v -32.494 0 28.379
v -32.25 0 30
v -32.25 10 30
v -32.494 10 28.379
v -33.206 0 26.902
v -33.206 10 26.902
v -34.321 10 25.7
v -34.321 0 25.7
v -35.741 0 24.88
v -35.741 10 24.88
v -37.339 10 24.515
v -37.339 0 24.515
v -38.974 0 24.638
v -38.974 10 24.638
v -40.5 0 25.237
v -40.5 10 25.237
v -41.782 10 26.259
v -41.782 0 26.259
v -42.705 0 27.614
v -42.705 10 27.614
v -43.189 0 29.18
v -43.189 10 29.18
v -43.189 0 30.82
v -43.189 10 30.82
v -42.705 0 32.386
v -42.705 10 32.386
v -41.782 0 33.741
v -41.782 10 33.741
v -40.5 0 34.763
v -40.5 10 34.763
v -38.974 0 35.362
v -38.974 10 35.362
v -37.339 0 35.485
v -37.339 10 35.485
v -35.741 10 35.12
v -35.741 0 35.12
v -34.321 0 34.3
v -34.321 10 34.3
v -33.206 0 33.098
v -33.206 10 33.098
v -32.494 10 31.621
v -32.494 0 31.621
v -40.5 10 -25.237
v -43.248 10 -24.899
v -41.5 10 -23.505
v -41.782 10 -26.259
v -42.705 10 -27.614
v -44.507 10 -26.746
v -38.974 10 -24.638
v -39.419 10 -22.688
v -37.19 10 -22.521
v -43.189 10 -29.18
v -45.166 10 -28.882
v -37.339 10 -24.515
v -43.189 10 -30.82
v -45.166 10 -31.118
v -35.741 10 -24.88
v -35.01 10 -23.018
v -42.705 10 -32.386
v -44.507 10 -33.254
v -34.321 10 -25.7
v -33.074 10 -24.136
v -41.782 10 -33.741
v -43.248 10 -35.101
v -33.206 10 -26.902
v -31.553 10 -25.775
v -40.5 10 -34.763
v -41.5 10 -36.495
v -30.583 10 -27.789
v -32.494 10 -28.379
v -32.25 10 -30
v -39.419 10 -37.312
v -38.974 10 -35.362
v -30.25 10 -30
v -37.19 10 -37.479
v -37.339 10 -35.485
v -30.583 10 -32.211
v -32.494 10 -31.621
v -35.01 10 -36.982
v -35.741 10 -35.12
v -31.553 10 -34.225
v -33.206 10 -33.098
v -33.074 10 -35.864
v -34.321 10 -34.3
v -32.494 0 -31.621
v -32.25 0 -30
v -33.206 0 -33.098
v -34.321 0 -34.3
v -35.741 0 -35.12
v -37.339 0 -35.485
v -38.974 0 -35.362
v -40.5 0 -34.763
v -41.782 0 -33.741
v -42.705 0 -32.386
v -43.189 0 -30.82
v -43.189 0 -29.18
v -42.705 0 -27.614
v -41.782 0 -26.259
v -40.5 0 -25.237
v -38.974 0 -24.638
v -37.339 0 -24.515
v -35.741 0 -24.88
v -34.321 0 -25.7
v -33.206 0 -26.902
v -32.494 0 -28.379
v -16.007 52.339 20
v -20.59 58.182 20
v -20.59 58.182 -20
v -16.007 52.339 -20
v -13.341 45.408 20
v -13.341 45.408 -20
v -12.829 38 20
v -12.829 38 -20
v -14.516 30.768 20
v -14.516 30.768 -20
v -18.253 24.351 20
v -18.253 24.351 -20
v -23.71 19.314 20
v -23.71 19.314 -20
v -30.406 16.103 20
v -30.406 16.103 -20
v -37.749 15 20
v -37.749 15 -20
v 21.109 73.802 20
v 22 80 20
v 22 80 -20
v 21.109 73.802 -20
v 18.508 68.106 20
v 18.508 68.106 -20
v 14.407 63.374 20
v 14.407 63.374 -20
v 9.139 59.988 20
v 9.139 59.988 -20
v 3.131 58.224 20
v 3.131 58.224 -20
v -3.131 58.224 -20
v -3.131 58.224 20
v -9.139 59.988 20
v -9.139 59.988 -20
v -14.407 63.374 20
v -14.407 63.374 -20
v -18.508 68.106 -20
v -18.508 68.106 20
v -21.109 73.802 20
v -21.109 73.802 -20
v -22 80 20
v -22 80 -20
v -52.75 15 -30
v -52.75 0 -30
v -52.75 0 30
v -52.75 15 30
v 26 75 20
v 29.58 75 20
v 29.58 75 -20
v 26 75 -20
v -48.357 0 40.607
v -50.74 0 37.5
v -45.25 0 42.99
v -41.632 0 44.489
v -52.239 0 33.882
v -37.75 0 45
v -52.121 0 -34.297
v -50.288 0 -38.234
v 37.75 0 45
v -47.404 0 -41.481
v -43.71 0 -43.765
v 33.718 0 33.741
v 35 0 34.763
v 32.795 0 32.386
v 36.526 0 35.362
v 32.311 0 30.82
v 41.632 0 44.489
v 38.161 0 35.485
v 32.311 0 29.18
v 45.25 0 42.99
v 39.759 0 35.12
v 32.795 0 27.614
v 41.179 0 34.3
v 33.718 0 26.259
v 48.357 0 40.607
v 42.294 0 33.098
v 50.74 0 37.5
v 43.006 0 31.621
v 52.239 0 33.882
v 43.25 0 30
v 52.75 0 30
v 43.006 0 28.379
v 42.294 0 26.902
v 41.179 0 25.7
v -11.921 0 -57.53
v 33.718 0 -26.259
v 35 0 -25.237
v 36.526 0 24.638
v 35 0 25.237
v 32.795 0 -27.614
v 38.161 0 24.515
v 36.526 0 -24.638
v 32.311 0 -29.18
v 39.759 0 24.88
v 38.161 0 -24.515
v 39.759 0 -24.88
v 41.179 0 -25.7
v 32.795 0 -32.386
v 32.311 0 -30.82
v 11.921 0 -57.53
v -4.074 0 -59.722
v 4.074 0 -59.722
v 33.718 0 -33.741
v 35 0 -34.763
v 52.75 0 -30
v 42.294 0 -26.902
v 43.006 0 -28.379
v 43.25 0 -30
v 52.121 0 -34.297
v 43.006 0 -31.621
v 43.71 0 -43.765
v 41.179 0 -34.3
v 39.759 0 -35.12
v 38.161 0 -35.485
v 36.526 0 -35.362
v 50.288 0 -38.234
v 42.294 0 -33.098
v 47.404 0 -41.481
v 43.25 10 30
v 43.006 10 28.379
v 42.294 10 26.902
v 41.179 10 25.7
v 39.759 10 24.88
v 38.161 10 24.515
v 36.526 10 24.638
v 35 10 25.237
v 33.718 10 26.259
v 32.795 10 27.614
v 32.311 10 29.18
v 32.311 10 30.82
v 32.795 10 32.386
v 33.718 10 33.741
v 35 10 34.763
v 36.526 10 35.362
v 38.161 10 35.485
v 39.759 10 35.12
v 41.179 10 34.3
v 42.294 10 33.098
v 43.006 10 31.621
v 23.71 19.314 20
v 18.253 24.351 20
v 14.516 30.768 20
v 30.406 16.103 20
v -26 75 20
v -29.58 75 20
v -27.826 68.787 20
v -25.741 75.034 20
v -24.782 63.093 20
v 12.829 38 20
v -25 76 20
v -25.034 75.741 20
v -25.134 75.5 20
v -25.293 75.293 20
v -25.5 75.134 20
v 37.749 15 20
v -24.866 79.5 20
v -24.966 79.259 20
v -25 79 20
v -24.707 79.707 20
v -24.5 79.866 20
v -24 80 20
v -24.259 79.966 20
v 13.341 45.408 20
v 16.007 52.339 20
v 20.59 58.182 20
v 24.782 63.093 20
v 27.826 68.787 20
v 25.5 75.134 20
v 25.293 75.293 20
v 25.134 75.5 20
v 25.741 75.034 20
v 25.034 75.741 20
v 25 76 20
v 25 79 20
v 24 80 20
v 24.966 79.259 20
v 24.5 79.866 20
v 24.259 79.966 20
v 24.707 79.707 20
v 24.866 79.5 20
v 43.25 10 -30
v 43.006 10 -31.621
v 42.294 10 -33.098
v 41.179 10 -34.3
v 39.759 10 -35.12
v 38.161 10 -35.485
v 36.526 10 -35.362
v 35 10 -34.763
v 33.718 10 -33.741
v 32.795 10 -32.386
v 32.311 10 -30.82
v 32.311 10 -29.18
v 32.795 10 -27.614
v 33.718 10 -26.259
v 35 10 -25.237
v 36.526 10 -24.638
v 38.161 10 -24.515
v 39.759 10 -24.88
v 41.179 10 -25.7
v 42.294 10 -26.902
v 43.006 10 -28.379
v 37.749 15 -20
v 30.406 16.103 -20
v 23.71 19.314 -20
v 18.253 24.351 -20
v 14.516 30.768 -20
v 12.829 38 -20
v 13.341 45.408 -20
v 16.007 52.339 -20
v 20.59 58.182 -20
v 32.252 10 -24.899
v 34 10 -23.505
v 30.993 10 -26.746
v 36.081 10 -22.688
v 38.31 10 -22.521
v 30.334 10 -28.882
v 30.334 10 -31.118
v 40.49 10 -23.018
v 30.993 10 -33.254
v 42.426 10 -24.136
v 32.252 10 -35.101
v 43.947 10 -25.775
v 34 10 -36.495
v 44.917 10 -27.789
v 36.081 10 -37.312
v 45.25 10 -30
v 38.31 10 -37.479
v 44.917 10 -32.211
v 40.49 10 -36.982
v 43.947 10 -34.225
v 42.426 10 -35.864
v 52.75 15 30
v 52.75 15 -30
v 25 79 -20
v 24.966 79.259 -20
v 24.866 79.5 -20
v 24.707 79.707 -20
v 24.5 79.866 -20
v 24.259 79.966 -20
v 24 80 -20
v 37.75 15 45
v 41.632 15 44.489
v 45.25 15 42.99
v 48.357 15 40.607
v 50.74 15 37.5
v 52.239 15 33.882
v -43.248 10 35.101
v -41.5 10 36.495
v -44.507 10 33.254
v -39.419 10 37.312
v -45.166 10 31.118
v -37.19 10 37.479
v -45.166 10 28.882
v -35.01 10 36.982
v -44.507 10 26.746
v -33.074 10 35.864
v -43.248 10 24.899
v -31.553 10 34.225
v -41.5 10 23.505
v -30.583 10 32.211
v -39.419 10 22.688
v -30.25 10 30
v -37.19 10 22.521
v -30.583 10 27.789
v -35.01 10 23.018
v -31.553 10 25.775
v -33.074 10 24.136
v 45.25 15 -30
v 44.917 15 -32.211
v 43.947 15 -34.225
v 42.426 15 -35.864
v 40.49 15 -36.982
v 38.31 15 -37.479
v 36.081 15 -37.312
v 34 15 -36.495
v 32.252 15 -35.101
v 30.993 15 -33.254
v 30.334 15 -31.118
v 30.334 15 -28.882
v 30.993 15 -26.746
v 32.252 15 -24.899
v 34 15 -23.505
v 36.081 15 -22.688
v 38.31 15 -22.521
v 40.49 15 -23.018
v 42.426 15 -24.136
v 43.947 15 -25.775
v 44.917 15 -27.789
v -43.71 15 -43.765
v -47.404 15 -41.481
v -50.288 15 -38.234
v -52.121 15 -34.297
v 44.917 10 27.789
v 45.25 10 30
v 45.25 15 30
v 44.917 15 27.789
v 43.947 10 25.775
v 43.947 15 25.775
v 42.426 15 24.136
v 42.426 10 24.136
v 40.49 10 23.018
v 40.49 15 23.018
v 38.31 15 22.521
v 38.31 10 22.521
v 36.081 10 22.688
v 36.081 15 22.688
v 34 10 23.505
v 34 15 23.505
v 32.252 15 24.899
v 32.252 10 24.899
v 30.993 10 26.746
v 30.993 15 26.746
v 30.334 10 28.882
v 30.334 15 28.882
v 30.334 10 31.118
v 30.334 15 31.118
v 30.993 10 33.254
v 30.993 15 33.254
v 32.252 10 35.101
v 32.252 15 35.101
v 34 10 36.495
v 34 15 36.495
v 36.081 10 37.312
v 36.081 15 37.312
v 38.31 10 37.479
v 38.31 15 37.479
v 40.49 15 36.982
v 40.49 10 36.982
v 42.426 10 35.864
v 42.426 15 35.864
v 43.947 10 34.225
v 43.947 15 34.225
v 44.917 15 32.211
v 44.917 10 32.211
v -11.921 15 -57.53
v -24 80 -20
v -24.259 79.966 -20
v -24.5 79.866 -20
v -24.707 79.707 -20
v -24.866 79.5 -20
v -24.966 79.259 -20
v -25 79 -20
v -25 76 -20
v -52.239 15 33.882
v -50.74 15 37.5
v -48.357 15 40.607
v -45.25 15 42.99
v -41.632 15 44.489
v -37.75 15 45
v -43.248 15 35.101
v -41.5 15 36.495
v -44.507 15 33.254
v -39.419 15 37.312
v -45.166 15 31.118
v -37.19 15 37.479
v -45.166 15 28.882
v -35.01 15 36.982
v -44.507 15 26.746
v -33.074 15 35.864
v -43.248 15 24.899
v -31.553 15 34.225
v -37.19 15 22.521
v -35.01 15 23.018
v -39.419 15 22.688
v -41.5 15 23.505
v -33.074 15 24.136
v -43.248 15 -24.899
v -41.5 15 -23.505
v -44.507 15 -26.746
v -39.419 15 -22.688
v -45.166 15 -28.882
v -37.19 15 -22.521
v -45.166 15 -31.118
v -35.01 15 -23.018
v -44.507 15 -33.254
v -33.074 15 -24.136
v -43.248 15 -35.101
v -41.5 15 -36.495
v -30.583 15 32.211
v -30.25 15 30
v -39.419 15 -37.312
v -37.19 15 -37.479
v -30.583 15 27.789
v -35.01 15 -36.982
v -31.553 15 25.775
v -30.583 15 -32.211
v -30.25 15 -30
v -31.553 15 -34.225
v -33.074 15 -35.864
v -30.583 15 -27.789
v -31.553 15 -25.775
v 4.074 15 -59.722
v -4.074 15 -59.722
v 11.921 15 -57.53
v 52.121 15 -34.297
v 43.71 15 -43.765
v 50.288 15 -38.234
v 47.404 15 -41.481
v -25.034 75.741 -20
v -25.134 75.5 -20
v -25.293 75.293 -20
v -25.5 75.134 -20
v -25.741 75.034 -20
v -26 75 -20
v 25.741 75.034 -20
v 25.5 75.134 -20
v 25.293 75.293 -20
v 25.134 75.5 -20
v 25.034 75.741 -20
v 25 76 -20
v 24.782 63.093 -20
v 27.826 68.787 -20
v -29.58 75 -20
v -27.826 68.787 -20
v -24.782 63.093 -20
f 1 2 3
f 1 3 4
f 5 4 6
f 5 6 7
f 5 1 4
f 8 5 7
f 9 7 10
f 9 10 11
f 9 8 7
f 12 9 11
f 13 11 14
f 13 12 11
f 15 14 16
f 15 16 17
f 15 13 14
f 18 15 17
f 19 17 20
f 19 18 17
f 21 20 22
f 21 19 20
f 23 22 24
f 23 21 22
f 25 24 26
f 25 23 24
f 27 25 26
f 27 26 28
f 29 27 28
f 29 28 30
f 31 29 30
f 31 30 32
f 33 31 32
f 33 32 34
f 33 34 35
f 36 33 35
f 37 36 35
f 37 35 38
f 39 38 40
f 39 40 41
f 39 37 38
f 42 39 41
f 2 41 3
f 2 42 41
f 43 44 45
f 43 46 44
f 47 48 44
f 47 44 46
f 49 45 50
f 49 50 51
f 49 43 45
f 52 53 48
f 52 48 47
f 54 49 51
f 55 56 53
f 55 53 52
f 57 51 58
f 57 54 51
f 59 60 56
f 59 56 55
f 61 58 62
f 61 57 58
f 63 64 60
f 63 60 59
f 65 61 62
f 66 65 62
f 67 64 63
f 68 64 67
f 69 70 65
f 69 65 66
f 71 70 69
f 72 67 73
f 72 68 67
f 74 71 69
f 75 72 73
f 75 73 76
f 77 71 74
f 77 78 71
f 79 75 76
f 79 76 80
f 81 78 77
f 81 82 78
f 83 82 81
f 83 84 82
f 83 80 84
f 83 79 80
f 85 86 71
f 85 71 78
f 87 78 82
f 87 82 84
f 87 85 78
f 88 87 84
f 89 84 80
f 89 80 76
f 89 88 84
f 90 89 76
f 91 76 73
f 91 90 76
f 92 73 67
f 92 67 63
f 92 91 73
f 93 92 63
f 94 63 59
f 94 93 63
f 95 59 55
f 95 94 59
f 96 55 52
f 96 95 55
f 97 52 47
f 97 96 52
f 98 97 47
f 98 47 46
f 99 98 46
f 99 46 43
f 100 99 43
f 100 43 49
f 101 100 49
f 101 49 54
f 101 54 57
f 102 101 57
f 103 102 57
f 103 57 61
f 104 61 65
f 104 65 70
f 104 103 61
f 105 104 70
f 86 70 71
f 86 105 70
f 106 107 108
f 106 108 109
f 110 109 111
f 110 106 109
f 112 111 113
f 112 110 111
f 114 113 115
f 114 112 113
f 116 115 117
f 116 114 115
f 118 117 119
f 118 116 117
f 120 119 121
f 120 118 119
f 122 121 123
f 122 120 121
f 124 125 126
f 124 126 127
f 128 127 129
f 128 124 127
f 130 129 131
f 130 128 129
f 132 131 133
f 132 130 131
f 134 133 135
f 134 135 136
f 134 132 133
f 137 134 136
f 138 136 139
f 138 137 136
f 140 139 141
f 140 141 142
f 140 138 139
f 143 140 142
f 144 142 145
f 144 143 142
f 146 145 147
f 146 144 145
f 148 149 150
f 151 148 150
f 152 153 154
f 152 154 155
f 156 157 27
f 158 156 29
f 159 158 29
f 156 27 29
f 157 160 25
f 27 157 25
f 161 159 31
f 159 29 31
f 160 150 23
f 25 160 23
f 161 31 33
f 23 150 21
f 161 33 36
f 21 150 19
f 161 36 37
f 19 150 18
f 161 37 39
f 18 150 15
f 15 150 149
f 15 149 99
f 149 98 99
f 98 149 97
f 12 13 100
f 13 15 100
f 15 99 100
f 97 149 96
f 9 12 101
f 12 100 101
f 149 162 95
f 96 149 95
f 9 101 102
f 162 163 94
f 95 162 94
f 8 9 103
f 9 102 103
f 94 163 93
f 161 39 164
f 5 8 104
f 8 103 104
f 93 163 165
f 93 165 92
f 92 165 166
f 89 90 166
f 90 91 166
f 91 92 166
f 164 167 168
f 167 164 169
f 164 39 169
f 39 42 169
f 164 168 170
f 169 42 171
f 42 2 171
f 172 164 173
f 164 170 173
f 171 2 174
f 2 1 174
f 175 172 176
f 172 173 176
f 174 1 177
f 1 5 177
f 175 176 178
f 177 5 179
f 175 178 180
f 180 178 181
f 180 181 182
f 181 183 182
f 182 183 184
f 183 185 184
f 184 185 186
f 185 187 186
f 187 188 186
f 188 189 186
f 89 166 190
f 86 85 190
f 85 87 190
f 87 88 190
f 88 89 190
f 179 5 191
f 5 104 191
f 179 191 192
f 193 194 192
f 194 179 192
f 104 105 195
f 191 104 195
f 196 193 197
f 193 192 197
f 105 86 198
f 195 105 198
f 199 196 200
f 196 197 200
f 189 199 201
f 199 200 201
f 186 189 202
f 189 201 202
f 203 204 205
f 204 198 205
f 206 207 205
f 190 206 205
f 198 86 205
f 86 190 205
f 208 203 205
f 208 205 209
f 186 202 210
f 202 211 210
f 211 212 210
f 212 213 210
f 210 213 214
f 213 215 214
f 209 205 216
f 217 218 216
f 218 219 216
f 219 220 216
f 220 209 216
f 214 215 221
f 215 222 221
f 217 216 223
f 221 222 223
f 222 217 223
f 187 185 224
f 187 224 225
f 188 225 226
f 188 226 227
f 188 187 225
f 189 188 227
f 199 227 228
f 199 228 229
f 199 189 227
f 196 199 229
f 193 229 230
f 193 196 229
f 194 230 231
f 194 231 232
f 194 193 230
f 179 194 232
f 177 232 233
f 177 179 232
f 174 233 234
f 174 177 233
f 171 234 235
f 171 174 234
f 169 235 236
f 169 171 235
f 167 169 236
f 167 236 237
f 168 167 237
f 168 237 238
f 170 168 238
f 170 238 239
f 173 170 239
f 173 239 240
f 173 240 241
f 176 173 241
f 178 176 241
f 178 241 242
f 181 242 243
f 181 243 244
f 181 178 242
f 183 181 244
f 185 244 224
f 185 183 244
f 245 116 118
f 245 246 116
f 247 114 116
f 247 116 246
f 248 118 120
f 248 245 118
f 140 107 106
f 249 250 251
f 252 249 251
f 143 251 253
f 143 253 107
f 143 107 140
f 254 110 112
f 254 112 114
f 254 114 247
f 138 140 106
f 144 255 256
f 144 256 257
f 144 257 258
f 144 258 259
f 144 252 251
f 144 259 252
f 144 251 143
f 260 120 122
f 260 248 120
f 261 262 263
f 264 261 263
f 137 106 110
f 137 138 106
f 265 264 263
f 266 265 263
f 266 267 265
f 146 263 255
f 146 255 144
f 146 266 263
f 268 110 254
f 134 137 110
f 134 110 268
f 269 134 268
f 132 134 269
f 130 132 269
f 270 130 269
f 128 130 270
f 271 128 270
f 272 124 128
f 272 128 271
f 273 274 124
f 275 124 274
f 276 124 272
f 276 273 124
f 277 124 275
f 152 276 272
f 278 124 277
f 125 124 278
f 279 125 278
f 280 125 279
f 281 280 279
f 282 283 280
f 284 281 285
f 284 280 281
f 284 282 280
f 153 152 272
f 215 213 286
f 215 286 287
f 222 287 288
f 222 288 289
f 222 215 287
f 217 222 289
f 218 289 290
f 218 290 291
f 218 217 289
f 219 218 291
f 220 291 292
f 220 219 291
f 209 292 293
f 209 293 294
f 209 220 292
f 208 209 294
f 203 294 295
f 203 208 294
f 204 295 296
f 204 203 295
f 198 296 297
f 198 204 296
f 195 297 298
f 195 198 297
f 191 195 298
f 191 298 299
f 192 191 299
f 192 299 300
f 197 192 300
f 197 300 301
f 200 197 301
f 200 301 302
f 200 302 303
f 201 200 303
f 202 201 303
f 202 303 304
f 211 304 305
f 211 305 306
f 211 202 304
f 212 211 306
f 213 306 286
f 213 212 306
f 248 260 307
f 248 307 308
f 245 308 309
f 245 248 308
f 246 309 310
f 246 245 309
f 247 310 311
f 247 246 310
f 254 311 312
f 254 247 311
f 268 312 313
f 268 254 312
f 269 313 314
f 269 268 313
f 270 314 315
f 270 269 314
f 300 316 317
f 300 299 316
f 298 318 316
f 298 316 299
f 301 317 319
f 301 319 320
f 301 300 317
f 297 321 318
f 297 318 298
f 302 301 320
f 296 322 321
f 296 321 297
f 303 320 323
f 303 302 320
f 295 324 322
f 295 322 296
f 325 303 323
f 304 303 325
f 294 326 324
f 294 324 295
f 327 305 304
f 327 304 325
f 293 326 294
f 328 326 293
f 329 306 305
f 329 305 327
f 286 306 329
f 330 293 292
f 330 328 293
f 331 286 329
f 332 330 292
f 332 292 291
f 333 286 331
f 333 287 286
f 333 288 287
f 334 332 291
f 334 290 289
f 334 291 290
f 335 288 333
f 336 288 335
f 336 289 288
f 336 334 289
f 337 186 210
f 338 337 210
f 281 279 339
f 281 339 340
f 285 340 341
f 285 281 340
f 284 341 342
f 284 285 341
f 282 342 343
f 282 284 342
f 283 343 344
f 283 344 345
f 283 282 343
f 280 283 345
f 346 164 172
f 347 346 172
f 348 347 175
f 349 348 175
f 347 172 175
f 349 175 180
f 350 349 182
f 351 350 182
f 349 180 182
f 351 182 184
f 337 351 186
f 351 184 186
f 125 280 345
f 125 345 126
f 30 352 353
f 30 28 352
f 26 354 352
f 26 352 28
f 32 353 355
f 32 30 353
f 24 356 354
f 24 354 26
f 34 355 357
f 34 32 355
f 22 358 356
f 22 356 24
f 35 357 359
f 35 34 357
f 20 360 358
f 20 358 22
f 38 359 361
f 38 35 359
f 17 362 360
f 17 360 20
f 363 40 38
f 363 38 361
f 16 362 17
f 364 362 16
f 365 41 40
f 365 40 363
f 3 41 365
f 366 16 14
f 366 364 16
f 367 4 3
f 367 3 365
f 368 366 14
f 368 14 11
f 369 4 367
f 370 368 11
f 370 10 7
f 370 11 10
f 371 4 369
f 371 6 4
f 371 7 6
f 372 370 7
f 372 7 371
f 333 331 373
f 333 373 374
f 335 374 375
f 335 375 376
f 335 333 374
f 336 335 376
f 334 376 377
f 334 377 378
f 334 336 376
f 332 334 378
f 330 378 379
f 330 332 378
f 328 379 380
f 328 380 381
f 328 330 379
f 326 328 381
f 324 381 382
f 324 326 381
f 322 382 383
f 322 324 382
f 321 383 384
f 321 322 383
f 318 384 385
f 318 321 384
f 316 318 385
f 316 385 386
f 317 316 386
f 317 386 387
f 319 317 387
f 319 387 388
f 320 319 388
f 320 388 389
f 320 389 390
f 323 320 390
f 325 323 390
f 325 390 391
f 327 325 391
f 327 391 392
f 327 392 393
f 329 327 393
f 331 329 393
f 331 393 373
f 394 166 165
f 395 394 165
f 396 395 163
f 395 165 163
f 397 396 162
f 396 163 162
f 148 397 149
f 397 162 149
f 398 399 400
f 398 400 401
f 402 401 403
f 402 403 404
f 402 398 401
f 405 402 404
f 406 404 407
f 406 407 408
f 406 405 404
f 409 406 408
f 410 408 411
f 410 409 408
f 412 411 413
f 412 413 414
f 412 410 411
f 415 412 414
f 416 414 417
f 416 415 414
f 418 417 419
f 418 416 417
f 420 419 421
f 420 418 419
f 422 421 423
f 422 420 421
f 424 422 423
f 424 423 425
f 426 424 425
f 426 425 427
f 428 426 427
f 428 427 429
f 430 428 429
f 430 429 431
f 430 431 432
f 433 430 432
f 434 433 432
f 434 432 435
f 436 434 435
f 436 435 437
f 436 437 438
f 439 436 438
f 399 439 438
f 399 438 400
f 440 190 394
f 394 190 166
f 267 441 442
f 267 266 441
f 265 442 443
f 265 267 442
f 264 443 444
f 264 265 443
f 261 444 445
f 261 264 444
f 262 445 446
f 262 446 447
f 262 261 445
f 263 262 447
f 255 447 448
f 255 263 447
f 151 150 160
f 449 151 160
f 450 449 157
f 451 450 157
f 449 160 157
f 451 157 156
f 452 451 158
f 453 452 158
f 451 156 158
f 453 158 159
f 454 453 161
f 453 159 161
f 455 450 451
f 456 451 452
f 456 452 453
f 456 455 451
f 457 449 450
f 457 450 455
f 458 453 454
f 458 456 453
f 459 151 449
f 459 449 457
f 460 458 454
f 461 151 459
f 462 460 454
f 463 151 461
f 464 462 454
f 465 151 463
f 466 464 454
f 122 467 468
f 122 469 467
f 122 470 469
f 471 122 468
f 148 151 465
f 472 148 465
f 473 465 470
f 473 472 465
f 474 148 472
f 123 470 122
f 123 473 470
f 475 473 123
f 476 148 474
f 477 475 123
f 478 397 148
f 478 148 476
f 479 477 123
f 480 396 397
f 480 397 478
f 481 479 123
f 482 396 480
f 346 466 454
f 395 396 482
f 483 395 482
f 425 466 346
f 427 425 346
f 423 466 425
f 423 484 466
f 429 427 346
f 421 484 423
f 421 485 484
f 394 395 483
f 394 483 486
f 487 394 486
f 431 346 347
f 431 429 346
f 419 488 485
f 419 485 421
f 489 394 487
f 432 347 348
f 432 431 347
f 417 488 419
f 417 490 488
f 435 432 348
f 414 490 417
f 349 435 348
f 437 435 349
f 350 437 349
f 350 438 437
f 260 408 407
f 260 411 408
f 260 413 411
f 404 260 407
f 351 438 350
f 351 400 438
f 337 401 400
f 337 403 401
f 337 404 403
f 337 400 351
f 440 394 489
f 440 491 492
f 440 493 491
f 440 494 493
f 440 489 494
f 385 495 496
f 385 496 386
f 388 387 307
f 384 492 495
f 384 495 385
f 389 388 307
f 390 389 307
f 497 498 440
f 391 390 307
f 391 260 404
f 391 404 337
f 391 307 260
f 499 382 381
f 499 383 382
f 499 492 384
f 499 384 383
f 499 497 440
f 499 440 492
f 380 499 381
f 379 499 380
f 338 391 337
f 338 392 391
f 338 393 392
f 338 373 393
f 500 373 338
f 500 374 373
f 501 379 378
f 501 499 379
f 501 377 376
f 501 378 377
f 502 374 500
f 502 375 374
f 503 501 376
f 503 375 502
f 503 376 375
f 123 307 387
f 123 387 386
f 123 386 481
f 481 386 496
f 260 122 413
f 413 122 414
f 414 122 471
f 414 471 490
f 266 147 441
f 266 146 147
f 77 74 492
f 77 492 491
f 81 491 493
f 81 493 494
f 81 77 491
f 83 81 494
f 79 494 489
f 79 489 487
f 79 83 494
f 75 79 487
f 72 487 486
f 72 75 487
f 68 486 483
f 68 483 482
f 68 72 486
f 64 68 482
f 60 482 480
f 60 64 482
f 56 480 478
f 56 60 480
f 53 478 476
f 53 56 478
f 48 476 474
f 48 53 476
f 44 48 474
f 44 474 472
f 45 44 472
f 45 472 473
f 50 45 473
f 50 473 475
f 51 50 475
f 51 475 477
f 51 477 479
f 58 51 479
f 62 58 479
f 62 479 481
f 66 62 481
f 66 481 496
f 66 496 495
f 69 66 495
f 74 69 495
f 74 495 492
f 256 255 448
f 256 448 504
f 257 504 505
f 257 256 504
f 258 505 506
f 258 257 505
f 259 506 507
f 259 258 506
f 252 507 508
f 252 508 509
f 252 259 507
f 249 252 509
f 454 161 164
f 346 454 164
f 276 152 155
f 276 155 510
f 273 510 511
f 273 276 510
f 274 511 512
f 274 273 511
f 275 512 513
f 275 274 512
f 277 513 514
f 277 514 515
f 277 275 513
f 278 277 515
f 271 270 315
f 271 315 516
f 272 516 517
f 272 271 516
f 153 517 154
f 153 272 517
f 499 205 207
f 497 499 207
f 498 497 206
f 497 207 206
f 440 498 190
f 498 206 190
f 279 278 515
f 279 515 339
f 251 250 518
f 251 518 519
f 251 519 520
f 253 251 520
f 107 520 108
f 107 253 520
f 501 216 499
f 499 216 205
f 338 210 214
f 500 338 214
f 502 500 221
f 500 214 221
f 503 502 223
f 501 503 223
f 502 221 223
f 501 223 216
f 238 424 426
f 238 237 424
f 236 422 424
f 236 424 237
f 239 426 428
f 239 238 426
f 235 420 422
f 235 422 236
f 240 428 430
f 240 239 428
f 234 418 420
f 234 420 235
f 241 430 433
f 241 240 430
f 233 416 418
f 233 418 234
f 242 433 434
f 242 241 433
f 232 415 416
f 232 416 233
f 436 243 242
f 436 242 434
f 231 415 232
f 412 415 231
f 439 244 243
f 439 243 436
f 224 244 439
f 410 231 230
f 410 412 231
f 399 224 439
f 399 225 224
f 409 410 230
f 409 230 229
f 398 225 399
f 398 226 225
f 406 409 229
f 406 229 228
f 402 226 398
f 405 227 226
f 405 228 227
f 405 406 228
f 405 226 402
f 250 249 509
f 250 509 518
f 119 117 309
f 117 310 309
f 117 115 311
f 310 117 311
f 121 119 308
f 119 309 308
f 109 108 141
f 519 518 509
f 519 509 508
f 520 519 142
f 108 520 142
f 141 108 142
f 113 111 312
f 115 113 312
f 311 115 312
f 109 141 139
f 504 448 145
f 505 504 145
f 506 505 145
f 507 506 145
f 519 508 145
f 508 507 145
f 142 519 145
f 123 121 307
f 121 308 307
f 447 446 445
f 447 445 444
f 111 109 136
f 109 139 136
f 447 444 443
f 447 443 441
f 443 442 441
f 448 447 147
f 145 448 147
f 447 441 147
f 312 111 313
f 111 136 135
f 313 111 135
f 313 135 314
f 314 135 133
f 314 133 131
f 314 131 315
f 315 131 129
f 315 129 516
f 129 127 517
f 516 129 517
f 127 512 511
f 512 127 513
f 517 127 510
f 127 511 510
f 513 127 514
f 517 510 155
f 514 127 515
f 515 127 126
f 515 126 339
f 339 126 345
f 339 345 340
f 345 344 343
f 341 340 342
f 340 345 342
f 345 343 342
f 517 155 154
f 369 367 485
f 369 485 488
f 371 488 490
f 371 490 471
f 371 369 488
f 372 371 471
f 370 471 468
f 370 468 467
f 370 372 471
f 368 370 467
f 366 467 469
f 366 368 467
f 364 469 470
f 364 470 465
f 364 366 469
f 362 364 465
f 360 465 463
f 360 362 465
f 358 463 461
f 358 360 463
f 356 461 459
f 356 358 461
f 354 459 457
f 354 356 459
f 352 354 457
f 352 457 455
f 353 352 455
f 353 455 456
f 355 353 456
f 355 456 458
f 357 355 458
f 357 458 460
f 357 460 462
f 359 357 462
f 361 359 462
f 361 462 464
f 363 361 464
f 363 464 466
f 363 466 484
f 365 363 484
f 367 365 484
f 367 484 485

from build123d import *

# Parameters (mm, degrees)
BOSS_EXTRUDE1_DEPTH = 15
SKETCH1_5_R         = 7.5
CUT_EXTRUDE2_DEPTH  = 15
SKETCH1_6_R         = 7.5
SKETCH1_6_R_2       = 5.5
BOSS_EXTRUDE2_DEPTH = 10
BOSS_EXTRUDE3_DEPTH = 20


with BuildPart() as part:
    # Sketch1 → Boss-Extrude1 (new body)
    with BuildSketch(Plane(origin=(0, 0, 0), x_dir=(1, 0, 0), z_dir=(0, 1, 0))):
        with BuildLine():
            Line((52.75, -30), (52.75, 30))
            ThreePointArc((52.75, 30), (50.288021644, 38.233954897), (43.710264901, 43.765000629))
            Line((43.710264901, 43.765000629), (11.920529801, 57.530001258))
            ThreePointArc((11.920529801, 57.530001258), (0, 60), (-11.920529801, 57.530001258))
            Line((-11.920529801, 57.530001258), (-43.710264901, 43.765000629))
            ThreePointArc((-43.710264901, 43.765000629), (-50.288021644, 38.233954897), (-52.75, 30))
            Line((-52.75, 30), (-52.75, -30))
            ThreePointArc((-52.75, -30), (-48.356601718, -40.606601718), (-37.75, -45))
            Line((-37.75, -45), (37.75, -45))
            ThreePointArc((37.75, -45), (48.356601718, -40.606601718), (52.75, -30))
        make_face()
    extrude(amount=BOSS_EXTRUDE1_DEPTH)

    # Sketch1<5> → Cut-Extrude2 (cut)
    with BuildSketch(Plane(origin=(0, 0, 0), x_dir=(1, 0, 0), z_dir=(0, 1, 0))):
        with Locations((-37.75, 30)):
            Circle(SKETCH1_5_R)
        with Locations((37.75, 30)):
            Circle(SKETCH1_5_R)
        with Locations((37.75, -30)):
            Circle(SKETCH1_5_R)
        with Locations((-37.75, -30)):
            Circle(SKETCH1_5_R)
    extrude(amount=CUT_EXTRUDE2_DEPTH, mode=Mode.SUBTRACT)

    # Sketch1<6> → Boss-Extrude2 (add)
    # profile 1 of 4: a face of its own
    with BuildSketch(Plane(origin=(0, 0, 0), x_dir=(1, 0, 0), z_dir=(0, 1, 0))):
        with Locations((-37.75, 30)):
            Circle(SKETCH1_6_R)
        with Locations((-37.75, 30)):
            Circle(SKETCH1_6_R_2, mode=Mode.SUBTRACT)
    # profile 2 of 4: a face of its own
    with BuildSketch(Plane(origin=(0, 0, 0), x_dir=(1, 0, 0), z_dir=(0, 1, 0))):
        with Locations((37.75, 30)):
            Circle(SKETCH1_6_R)
        with Locations((37.75, 30)):
            Circle(SKETCH1_6_R_2, mode=Mode.SUBTRACT)
    # profile 3 of 4: a face of its own
    with BuildSketch(Plane(origin=(0, 0, 0), x_dir=(1, 0, 0), z_dir=(0, 1, 0))):
        with Locations((37.75, -30)):
            Circle(SKETCH1_6_R)
        with Locations((37.75, -30)):
            Circle(SKETCH1_6_R_2, mode=Mode.SUBTRACT)
    # profile 4 of 4: a face of its own
    with BuildSketch(Plane(origin=(0, 0, 0), x_dir=(1, 0, 0), z_dir=(0, 1, 0))):
        with Locations((-37.75, -30)):
            Circle(SKETCH1_6_R)
        with Locations((-37.75, -30)):
            Circle(SKETCH1_6_R_2, mode=Mode.SUBTRACT)
    extrude(amount=BOSS_EXTRUDE2_DEPTH)

    # Sketch2 → Boss-Extrude3 (add, symmetric)
    with BuildSketch(Plane.XY):
        with BuildLine():
            Line((-25, 79), (-25, 76))
            ThreePointArc((-25, 76), (-25.292893219, 75.292893219), (-26, 75))
            Line((-26, 75), (-29.580398915, 75))
            ThreePointArc((-29.580398915, 75), (-26.457352845, 65.85756455), (-20.590457551, 58.181818182))
            ThreePointArc((-20.590457551, 58.181818182), (-14.516162744, 30.768138177), (-37.749172176, 15))
            Line((-37.749172176, 15), (37.749172176, 15))
            ThreePointArc((37.749172176, 15), (14.516162744, 30.768138177), (20.590457551, 58.181818182))
            ThreePointArc((20.590457551, 58.181818182), (26.457352845, 65.85756455), (29.580398915, 75))
            Line((29.580398915, 75), (26, 75))
            ThreePointArc((26, 75), (25.292893219, 75.292893219), (25, 76))
            Line((25, 76), (25, 79))
            ThreePointArc((25, 79), (24.707106781, 79.707106781), (24, 80))
            Line((24, 80), (22, 80))
            ThreePointArc((22, 80), (0, 58), (-22, 80))
            Line((-22, 80), (-24, 80))
            ThreePointArc((-24, 80), (-24.707106781, 79.707106781), (-25, 79))
        make_face()
    extrude(amount=BOSS_EXTRUDE3_DEPTH, both=True)


solid = part.part
